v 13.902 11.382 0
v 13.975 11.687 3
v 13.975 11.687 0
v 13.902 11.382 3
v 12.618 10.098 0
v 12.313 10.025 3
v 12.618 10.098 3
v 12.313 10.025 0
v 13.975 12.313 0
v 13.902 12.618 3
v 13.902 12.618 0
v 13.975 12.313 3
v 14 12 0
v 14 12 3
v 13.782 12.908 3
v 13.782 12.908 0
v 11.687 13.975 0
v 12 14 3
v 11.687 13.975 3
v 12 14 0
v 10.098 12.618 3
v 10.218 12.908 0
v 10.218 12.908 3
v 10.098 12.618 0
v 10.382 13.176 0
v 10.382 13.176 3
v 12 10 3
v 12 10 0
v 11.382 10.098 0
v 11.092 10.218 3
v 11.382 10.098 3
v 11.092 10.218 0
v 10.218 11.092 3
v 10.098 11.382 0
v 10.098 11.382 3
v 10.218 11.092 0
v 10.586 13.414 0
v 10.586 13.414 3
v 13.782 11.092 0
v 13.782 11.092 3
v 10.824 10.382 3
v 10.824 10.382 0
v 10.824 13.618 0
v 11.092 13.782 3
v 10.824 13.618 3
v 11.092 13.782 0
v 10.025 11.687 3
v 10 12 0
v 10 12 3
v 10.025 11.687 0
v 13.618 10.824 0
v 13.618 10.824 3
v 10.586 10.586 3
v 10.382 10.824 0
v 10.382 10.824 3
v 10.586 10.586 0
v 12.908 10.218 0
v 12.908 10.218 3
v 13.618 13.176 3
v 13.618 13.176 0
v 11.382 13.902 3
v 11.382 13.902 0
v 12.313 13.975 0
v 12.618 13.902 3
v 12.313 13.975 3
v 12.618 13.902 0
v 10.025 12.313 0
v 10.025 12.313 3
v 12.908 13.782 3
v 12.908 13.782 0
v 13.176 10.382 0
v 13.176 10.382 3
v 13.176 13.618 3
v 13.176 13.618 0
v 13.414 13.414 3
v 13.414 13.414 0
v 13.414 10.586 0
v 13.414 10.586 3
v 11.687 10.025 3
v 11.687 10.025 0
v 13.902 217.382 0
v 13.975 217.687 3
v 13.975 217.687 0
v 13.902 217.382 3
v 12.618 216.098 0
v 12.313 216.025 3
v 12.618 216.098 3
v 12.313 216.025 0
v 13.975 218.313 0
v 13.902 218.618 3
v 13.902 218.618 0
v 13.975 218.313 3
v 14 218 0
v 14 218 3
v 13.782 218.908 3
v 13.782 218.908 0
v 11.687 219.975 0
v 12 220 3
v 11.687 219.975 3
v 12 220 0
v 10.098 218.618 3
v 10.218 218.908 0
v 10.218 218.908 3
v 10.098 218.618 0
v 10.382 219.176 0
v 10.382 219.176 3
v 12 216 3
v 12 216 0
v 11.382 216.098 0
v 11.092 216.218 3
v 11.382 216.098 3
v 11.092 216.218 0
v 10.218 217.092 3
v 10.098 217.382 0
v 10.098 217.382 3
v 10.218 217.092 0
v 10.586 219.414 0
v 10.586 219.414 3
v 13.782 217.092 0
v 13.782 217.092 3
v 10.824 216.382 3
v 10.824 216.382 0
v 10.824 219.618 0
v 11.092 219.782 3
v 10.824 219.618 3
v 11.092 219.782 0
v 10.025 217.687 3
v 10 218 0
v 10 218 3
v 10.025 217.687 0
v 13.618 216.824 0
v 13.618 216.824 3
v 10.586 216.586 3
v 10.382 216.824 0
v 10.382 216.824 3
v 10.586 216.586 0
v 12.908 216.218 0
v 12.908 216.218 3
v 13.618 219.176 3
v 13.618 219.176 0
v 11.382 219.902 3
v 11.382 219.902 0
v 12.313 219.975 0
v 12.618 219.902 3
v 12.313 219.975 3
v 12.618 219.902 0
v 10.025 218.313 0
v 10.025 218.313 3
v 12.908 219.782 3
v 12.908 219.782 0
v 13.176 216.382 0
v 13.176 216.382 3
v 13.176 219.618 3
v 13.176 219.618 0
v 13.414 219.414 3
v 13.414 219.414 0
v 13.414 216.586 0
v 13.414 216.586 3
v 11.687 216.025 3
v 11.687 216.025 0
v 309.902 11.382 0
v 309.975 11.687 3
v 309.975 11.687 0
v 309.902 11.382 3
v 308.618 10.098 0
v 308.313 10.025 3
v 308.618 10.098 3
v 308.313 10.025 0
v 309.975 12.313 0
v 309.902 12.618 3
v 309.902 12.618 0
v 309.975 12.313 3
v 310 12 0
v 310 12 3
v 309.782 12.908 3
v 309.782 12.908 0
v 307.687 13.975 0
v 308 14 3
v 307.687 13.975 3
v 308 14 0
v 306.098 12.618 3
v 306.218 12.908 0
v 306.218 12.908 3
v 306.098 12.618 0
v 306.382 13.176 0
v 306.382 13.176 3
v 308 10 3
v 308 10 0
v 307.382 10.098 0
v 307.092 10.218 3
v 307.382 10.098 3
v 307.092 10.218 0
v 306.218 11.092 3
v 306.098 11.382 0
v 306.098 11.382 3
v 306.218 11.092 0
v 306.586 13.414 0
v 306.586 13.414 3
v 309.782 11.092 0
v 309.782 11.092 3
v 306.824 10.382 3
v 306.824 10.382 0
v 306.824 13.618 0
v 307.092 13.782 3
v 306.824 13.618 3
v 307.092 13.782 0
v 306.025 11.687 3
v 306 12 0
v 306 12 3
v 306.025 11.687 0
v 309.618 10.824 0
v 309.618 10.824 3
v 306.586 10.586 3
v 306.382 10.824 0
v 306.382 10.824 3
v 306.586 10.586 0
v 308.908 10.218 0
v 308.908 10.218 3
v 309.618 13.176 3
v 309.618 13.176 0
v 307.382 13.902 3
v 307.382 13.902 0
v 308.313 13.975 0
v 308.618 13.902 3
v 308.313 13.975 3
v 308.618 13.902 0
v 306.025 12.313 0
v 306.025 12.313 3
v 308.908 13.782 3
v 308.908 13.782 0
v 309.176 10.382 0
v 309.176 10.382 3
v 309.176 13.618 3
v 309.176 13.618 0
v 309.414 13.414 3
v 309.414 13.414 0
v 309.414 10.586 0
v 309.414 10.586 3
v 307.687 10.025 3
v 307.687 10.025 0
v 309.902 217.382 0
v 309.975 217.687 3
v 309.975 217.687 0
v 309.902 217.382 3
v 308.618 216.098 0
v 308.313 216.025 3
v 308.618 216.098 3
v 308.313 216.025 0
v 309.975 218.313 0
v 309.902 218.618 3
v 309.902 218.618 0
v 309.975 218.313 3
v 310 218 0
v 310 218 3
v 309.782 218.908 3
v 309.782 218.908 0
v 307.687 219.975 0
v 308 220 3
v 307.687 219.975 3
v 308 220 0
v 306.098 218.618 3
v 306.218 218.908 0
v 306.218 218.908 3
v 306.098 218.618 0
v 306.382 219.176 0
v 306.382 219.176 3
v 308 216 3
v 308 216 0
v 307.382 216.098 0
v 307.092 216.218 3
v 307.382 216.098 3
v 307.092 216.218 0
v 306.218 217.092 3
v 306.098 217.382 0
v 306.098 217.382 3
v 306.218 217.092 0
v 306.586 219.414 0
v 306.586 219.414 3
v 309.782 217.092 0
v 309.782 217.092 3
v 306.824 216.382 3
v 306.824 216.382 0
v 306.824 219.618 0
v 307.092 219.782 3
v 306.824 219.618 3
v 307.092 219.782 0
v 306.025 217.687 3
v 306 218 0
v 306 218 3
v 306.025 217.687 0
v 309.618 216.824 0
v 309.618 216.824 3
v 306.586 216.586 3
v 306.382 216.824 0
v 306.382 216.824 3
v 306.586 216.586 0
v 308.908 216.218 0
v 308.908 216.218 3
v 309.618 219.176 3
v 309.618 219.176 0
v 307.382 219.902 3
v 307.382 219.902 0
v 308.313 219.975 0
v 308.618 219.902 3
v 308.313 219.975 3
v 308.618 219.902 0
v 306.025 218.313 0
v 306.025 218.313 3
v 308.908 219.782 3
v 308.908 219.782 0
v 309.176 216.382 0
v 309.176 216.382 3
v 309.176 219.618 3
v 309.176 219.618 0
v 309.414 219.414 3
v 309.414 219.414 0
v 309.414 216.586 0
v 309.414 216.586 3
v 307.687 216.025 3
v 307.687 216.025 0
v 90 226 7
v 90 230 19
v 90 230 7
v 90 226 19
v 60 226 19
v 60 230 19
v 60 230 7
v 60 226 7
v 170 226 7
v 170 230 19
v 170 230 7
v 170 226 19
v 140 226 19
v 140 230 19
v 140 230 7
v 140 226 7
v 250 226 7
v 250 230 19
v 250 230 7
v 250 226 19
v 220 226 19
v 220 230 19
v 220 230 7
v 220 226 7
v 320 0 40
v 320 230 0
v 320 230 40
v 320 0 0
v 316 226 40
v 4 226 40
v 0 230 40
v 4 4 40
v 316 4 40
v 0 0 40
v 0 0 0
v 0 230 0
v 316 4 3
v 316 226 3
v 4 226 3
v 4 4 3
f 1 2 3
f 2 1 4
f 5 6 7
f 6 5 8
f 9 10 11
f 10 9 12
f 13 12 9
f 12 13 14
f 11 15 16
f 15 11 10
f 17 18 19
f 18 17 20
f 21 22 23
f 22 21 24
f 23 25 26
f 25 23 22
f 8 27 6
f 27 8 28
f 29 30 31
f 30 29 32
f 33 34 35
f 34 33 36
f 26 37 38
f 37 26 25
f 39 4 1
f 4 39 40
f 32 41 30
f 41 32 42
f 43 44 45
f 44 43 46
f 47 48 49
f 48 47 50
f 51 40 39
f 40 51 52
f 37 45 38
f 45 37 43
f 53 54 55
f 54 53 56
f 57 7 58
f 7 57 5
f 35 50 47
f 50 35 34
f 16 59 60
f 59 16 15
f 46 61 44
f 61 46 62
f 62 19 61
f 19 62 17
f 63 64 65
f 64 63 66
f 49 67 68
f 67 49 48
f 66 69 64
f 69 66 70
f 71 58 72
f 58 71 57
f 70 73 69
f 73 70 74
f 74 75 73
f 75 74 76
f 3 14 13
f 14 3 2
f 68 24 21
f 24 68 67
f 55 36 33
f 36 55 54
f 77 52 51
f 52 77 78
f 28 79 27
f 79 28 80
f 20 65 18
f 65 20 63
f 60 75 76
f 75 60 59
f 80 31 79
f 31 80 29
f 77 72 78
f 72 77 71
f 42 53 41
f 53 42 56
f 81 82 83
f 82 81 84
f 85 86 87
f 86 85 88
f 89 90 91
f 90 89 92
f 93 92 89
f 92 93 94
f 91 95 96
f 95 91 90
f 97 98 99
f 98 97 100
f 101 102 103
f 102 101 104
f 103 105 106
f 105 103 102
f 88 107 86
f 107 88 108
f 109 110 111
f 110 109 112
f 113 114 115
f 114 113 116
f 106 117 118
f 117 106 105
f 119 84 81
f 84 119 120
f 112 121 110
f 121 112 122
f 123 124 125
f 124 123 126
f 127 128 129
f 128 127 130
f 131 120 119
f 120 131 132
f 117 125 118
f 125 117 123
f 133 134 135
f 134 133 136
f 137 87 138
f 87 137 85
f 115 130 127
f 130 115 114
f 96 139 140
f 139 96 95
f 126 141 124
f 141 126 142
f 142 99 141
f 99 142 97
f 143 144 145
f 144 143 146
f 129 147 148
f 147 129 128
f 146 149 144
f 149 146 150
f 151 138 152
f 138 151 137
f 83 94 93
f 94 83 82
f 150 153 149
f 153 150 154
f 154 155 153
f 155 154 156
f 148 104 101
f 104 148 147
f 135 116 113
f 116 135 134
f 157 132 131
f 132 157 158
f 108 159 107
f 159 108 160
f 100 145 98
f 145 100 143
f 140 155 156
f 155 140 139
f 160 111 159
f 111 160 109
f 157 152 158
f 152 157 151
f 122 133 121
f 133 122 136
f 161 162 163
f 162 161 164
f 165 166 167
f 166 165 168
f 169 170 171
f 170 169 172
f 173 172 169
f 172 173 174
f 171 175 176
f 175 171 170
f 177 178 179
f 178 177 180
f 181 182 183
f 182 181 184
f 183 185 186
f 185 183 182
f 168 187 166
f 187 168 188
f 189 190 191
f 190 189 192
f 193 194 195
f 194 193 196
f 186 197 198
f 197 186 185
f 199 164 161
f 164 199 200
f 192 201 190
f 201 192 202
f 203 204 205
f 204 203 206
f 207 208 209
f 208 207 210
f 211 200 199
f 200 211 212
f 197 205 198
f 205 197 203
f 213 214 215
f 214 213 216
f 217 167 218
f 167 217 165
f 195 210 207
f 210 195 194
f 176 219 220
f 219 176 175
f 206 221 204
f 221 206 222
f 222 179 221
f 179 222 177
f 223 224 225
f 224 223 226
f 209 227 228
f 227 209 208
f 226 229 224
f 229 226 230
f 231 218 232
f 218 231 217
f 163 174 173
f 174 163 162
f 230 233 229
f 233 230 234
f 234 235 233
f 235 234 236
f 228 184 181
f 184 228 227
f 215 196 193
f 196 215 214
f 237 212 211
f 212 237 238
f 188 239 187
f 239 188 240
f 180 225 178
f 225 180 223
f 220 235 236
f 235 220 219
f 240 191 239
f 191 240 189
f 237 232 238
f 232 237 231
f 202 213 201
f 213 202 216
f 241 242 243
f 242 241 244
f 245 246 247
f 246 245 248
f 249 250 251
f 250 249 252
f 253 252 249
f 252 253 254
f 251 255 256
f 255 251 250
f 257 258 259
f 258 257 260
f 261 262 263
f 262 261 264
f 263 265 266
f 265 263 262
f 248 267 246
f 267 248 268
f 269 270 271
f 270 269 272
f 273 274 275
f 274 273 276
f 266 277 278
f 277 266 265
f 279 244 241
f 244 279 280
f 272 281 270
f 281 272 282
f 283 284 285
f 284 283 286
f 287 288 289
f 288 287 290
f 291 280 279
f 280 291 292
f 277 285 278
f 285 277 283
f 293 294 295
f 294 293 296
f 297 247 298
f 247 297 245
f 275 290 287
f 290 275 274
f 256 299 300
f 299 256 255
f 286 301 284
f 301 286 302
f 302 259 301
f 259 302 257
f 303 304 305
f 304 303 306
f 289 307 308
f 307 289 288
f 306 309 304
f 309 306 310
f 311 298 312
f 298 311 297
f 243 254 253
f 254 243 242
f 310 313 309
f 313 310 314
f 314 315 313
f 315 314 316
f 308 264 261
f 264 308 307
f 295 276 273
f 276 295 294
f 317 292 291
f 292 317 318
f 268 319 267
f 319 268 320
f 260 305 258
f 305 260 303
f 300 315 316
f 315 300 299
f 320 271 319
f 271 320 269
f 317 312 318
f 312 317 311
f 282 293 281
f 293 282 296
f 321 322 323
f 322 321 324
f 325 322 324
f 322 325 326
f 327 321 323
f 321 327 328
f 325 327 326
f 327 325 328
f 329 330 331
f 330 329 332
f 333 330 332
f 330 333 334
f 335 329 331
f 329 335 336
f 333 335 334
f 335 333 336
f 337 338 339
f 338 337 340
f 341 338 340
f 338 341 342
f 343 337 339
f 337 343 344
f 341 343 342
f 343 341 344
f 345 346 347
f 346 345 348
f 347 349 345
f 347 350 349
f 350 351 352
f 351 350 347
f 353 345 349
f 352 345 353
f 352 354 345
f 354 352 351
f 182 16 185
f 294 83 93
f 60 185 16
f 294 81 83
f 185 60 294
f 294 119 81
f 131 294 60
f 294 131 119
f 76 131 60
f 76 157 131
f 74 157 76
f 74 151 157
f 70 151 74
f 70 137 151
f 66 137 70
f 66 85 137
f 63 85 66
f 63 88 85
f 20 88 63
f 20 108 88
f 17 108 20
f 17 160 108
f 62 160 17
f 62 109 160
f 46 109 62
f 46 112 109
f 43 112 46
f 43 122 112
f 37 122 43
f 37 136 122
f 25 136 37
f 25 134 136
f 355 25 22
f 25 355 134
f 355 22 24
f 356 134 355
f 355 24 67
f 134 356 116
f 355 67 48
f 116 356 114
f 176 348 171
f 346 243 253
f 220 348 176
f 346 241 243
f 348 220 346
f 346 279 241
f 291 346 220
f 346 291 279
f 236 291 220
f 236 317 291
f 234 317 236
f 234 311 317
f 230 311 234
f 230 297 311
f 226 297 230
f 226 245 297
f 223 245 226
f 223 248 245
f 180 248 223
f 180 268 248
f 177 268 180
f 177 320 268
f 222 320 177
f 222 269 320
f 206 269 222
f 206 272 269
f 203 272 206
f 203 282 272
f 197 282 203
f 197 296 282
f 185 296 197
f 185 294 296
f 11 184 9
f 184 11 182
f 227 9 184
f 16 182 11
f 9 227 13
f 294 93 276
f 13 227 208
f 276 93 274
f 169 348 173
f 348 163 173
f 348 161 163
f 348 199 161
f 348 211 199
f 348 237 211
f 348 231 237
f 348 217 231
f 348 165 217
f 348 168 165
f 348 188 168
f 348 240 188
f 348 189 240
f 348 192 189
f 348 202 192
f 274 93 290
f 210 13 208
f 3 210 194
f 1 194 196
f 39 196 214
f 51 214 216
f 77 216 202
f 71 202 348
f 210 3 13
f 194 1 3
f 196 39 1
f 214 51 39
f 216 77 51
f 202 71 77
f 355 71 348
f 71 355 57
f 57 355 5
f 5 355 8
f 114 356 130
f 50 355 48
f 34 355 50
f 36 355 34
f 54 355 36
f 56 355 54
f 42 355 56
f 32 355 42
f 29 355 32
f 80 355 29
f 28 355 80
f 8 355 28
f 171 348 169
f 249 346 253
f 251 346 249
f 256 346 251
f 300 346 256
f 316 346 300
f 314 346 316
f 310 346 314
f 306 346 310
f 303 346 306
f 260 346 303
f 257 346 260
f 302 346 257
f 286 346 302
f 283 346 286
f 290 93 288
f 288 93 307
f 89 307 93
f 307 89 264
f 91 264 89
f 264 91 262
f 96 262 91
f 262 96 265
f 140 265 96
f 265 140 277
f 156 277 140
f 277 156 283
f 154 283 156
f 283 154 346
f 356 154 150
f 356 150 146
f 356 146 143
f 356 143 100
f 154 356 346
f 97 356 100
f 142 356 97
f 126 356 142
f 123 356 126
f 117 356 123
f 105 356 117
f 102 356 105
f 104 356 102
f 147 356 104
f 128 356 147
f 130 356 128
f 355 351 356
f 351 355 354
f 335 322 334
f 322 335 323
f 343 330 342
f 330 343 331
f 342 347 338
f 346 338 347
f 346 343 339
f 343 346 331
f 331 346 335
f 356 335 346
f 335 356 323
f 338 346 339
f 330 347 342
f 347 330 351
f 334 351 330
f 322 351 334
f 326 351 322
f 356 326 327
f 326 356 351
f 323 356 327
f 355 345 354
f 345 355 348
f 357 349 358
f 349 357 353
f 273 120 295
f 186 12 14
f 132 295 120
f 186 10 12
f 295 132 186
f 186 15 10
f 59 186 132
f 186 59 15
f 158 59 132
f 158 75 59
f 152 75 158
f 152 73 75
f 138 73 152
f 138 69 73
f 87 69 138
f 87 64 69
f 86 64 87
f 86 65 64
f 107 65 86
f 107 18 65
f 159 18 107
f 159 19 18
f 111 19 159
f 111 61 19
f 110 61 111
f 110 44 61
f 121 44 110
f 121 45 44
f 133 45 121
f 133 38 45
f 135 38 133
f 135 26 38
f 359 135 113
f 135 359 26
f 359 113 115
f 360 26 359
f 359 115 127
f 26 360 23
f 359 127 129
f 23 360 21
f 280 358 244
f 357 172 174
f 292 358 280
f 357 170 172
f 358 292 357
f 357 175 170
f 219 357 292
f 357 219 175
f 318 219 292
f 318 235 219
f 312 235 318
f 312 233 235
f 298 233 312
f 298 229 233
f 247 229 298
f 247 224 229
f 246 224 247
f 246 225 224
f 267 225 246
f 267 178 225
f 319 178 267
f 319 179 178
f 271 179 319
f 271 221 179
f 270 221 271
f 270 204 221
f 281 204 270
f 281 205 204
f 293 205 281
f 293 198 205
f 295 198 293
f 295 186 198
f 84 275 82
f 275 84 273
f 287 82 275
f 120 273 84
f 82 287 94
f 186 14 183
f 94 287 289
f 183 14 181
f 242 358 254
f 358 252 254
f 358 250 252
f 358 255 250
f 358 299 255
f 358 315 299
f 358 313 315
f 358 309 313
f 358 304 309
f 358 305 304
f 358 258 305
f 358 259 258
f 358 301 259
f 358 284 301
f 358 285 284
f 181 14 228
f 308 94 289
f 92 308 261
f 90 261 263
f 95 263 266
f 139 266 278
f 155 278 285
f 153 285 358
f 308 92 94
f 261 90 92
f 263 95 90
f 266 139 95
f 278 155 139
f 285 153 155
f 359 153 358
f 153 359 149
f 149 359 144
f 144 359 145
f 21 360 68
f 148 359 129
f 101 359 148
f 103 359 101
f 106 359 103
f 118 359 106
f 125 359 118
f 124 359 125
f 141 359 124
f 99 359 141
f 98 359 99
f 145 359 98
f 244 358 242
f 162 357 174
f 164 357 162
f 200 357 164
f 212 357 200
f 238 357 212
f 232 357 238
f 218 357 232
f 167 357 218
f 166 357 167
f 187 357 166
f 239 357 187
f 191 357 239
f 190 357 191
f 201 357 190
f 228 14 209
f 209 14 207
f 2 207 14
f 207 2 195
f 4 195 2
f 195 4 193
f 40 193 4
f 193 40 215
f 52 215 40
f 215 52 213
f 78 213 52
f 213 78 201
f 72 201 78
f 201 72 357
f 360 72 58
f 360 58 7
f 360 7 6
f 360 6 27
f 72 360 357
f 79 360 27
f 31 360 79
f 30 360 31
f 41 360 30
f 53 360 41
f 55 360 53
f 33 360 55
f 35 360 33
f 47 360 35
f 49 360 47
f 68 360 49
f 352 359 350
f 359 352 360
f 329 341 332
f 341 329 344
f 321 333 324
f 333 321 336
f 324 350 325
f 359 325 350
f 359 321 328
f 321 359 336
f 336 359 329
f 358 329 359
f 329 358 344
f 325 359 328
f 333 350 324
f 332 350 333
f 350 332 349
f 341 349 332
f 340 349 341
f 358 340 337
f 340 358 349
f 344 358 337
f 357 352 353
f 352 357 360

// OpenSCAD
$fn=24;
// Concept mm: componenti e tolleranze da definire.
$fn=40;
difference(){cube([320,230,40]);translate([4,4,3])cube([312,222,40]);for(x=[12,308])for(y=[12,218])translate([x,y,-1])cylinder(h=42,r=2);for(x=[60,140,220])translate([x,225,7])cube([30,8,12]);}
